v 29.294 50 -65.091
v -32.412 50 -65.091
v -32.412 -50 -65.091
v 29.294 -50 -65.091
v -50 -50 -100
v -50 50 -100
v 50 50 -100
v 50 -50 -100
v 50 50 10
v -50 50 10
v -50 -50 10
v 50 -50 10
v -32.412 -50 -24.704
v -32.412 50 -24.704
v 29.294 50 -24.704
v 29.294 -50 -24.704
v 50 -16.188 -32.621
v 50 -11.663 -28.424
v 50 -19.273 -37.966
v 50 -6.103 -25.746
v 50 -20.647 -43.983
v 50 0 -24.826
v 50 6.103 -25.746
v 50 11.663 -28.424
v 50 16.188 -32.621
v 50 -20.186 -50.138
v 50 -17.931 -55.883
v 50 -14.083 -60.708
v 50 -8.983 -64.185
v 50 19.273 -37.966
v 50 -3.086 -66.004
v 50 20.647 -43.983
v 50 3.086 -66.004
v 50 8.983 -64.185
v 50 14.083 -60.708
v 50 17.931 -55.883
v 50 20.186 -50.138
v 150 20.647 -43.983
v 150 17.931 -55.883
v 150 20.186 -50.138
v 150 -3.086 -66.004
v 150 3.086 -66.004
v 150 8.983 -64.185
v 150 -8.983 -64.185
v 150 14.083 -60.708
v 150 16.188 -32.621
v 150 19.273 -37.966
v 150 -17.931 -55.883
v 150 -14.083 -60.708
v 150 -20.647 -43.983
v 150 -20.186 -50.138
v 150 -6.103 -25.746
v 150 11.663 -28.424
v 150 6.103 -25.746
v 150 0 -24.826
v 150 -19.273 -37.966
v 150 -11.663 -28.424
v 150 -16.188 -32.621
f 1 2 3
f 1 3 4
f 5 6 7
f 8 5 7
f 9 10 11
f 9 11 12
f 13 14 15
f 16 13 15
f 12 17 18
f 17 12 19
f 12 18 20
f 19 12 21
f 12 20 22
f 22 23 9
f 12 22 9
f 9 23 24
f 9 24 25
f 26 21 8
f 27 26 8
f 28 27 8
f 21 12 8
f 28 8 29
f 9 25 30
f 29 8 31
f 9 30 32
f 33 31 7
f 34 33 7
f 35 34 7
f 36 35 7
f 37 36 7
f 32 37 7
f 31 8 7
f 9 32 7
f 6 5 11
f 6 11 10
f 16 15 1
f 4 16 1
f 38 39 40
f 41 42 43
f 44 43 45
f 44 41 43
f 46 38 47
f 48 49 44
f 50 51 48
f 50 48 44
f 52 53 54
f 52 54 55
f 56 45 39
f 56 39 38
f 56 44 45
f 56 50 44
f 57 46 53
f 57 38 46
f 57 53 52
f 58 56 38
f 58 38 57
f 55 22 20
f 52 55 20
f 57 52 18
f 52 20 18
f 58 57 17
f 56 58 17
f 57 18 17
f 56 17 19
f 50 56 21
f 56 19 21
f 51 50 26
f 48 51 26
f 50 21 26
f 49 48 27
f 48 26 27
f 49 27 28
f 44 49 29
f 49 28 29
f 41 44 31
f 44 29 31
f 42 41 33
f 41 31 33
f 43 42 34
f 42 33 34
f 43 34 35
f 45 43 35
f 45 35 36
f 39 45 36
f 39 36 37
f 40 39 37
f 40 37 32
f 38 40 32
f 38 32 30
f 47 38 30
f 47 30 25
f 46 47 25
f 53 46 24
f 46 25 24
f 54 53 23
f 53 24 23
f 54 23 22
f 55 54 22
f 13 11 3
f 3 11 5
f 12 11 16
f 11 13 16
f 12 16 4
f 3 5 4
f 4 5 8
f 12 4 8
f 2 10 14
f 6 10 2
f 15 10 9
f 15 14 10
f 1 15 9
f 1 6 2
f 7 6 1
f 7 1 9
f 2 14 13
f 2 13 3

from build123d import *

# Parameters (mm, degrees)
BOSS_EXTRUDE1_DEPTH      = 10
BOSS_EXTRUDE1_DEPTH_BACK = 100
SKETCH2_W                = 100
SKETCH2_H                = 100
SKETCH3_R                = 20.704608813
BOSS_EXTRUDE2_DEPTH      = 100
SKETCH4_W                = 61.706837877
SKETCH4_H                = 40.386202863
CUT_EXTRUDE1_DEPTH       = 207.155281281


with BuildPart() as part:
    # Sketch2 → Boss-Extrude1 (new, two sides: drawn at the far end of the back side and taken through both)
    with BuildSketch(Plane.XY.offset(-BOSS_EXTRUDE1_DEPTH_BACK)):
        Rectangle(SKETCH2_W, SKETCH2_H)
    extrude(amount=BOSS_EXTRUDE1_DEPTH + BOSS_EXTRUDE1_DEPTH_BACK)

    # Sketch3 → Boss-Extrude2 (add)
    with BuildSketch(Plane(origin=(50, 0, 0), x_dir=(0, 0, -1), z_dir=(1, 0, 0))):
        with Locations(Location((45.530604039, 0, 0), (0, 0, 180))):
            Circle(SKETCH3_R)
    extrude(amount=BOSS_EXTRUDE2_DEPTH)

    # Sketch4 → Cut-Extrude1 (cut, through all)
    with BuildSketch(Plane(origin=(0, 50, 0), x_dir=(1, 0, 0), z_dir=(0, 1, 0))):
        with Locations((-1.559035635, 44.897496948)):
            Rectangle(SKETCH4_W, SKETCH4_H)
    extrude(amount=-CUT_EXTRUDE1_DEPTH, mode=Mode.SUBTRACT)


solid = part.part
